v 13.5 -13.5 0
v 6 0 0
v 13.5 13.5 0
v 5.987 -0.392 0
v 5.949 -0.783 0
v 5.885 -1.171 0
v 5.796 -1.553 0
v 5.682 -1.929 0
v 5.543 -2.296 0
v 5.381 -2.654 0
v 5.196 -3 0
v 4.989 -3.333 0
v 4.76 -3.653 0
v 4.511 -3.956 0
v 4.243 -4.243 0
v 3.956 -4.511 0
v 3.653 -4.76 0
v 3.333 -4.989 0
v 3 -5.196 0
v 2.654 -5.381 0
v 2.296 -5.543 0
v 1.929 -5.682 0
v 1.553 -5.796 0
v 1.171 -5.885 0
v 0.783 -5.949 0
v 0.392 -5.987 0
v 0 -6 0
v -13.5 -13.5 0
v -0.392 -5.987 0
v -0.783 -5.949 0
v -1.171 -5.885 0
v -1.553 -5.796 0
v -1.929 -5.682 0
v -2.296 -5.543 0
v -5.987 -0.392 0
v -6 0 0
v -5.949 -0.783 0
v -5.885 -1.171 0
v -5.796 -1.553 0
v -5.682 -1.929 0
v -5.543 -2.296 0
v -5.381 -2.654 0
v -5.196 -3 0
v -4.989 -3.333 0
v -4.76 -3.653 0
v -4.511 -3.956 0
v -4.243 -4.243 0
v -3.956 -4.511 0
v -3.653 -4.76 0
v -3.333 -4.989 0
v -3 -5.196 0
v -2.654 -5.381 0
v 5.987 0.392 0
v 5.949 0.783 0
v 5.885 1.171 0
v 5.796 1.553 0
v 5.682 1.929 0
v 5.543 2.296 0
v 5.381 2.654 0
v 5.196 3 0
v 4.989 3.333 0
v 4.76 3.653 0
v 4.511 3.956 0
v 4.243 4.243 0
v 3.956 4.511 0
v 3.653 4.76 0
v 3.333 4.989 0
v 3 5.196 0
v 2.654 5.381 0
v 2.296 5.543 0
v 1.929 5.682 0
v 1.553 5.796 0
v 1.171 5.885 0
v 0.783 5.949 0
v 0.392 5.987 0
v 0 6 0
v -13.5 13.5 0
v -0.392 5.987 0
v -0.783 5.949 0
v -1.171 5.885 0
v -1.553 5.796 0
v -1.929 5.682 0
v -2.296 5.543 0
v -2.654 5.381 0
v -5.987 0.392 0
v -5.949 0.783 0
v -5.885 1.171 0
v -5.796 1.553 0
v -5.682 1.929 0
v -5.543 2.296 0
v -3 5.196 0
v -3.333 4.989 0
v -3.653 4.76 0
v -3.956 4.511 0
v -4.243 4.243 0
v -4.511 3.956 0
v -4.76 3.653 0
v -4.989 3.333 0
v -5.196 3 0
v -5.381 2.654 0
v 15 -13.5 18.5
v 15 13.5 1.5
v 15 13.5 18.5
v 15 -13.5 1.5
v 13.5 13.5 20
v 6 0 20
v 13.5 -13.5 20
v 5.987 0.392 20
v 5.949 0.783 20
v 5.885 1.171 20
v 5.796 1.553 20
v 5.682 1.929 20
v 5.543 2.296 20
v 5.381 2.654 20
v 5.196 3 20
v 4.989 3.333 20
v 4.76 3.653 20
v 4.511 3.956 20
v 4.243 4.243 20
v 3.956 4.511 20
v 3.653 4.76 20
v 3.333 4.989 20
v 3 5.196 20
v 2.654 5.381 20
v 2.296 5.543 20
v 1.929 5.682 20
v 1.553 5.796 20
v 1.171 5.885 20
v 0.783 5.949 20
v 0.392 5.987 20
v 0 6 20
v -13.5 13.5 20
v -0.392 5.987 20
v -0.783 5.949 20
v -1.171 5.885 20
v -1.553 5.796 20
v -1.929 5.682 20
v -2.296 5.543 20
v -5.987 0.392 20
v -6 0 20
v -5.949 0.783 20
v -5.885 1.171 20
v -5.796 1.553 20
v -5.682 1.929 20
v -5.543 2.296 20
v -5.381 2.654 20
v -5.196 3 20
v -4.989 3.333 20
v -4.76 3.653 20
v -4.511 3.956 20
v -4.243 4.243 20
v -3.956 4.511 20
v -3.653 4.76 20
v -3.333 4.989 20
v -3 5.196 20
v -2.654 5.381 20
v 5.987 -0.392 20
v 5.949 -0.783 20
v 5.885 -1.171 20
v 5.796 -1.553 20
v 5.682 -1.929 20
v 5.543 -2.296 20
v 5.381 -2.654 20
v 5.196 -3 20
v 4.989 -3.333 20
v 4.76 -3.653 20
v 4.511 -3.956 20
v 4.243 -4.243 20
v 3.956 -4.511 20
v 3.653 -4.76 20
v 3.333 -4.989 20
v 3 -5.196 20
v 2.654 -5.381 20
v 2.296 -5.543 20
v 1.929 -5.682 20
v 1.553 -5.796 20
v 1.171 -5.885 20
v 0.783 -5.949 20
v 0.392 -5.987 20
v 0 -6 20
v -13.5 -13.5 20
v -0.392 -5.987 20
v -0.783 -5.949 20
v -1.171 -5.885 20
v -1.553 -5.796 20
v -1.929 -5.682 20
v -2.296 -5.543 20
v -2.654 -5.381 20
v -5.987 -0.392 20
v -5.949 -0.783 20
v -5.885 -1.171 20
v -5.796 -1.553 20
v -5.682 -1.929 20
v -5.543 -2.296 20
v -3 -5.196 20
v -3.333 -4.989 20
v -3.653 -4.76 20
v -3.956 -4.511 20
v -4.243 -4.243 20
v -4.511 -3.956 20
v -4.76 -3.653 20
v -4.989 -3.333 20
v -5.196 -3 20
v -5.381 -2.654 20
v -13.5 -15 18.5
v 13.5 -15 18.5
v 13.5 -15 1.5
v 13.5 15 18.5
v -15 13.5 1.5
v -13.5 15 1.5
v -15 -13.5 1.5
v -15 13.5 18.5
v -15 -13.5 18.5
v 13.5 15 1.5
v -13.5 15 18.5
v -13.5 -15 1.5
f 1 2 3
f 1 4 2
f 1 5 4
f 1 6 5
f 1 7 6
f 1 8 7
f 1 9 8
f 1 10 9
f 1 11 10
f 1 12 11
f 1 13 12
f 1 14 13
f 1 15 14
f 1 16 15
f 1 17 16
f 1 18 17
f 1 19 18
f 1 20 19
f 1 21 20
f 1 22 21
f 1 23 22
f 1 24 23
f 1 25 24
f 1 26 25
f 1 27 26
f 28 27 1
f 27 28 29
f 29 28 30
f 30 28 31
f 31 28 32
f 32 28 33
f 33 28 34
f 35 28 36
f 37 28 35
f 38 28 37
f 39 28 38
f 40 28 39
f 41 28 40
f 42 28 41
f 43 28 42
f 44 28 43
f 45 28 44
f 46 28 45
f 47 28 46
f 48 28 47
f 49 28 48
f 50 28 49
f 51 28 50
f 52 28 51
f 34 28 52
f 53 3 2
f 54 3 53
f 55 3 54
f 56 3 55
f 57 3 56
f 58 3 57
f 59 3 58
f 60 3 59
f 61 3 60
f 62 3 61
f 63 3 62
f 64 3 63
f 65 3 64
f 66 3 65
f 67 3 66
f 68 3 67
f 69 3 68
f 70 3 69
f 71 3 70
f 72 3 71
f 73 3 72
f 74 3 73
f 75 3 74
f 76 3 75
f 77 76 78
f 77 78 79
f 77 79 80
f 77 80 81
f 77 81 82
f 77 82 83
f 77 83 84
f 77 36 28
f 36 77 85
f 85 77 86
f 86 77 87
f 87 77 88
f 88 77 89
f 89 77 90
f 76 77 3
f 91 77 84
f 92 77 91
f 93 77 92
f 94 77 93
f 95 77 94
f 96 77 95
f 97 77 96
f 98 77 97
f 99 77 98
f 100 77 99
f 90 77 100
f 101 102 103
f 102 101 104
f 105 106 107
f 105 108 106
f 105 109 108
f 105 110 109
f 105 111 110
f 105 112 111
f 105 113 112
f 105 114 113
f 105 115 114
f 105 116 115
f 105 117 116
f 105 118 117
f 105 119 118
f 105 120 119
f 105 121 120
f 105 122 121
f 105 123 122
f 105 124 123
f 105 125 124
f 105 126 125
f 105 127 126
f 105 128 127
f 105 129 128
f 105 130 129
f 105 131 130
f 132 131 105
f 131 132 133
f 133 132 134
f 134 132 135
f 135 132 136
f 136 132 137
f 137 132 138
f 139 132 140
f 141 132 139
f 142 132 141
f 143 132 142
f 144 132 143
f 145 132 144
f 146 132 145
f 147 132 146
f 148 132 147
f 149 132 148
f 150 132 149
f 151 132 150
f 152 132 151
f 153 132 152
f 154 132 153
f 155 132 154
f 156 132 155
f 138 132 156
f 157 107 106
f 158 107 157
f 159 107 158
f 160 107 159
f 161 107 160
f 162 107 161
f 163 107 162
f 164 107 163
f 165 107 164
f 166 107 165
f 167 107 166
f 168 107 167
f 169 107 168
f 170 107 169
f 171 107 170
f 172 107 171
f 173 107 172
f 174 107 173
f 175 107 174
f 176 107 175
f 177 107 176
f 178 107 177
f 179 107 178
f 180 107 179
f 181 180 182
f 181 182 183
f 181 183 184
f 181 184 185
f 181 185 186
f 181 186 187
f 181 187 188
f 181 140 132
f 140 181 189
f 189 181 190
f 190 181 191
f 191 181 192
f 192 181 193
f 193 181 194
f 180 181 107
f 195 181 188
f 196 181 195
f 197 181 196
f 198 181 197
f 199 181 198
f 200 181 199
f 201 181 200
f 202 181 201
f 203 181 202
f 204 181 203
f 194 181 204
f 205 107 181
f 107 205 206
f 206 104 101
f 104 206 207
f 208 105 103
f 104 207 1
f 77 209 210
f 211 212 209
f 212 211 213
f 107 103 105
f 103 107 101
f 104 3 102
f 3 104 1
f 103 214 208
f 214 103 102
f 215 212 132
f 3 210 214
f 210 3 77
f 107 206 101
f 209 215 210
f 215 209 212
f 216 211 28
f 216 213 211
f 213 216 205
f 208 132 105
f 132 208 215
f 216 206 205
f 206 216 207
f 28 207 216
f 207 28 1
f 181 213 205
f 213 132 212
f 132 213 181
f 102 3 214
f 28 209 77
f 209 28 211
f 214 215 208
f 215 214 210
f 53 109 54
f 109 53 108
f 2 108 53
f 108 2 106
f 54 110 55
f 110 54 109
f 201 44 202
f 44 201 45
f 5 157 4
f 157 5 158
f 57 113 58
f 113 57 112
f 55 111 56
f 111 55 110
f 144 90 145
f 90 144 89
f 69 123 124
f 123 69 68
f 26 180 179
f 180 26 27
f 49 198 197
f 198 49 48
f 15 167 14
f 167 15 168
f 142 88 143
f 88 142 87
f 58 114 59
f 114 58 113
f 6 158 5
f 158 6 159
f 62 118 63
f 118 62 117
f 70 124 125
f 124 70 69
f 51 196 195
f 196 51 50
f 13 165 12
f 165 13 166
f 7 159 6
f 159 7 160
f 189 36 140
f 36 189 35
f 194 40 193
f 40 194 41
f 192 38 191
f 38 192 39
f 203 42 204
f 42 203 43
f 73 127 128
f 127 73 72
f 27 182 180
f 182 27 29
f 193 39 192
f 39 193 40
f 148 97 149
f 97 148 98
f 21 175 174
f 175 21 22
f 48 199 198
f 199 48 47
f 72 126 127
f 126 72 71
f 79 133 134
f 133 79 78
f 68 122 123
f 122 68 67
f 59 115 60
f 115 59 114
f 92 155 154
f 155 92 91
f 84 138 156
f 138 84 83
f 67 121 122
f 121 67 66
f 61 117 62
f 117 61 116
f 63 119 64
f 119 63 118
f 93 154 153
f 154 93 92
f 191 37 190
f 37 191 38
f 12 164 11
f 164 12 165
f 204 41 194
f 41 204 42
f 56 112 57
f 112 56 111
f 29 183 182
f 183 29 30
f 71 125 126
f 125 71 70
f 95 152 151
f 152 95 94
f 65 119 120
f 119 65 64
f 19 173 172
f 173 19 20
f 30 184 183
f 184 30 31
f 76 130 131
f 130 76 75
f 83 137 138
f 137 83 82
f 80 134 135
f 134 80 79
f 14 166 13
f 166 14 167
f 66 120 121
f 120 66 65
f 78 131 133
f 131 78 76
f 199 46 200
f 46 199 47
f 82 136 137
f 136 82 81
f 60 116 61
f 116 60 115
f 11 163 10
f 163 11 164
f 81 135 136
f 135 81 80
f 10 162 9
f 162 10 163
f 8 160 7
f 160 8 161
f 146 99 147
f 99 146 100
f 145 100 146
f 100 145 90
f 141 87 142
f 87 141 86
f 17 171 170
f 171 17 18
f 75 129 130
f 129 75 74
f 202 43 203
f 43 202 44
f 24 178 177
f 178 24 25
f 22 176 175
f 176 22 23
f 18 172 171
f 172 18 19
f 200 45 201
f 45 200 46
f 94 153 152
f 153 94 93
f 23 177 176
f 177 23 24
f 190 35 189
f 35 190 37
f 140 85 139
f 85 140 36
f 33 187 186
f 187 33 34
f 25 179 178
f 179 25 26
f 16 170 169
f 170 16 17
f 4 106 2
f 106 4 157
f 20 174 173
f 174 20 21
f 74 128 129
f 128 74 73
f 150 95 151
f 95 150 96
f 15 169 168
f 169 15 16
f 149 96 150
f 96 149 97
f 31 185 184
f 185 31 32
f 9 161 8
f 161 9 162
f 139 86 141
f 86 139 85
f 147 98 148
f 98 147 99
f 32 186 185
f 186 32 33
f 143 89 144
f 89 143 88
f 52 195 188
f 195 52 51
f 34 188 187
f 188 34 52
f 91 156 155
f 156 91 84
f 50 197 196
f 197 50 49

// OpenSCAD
body_size = 30; height = 20; bore_diameter = 12; chamfer = 1.5;
difference() {
  hull() {
    translate([-body_size/2 + chamfer, -body_size/2 + chamfer, 0]) cube([body_size - 2*chamfer, body_size - 2*chamfer, height]);
    translate([-body_size/2, -body_size/2 + chamfer, chamfer]) cube([body_size, body_size - 2*chamfer, height - 2*chamfer]);
    translate([-body_size/2 + chamfer, -body_size/2, chamfer]) cube([body_size - 2*chamfer, body_size, height - 2*chamfer]);
  }
  translate([0, 0, -1]) cylinder(d = bore_diameter, h = height + 2, $fn = 96);
}
